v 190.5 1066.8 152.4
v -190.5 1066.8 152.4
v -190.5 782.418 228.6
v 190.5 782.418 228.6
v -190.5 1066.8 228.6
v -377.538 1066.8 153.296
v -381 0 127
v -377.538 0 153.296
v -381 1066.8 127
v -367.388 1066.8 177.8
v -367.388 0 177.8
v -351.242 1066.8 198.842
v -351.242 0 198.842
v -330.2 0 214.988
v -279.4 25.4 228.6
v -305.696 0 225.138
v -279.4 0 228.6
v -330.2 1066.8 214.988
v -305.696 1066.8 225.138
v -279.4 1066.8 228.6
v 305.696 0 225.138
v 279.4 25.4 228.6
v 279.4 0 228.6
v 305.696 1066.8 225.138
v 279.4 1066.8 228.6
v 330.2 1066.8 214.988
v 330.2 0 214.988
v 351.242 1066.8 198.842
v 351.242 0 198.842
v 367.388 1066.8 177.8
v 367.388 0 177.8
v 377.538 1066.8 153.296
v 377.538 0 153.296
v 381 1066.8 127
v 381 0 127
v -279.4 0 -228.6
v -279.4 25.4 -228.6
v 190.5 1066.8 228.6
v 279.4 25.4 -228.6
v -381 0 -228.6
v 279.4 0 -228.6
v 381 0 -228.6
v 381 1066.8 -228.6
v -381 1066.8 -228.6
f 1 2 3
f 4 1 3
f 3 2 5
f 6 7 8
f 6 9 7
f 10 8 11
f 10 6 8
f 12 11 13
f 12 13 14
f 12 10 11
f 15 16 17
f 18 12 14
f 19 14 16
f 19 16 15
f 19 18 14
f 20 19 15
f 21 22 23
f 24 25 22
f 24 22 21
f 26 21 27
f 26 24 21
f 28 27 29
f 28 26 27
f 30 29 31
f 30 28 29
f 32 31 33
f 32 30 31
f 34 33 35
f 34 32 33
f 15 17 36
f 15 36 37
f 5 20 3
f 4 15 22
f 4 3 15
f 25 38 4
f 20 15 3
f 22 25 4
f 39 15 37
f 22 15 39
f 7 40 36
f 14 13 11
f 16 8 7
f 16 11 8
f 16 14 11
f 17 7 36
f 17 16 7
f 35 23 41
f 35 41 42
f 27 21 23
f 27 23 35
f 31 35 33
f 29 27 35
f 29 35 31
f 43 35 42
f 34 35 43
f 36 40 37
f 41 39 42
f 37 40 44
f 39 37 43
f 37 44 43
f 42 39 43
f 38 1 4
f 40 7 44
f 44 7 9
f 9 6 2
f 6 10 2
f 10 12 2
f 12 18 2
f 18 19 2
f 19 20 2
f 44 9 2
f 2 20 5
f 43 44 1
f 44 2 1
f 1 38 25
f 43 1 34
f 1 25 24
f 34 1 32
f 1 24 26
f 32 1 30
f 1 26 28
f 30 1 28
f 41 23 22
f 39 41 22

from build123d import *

# Parameters (mm, degrees)
SKETCH1_W           = 762
SKETCH1_H           = 1066.8
BOSS_EXTRUDE1_DEPTH = 228.6
FILLET1_R           = 101.6
SKETCH2_W           = 558.8
SKETCH2_H           = 25.4
CUT_EXTRUDE1_DEPTH  = 1222.578929091
CUT_EXTRUDE2_DEPTH  = 190.5


with BuildPart() as part:
    # Sketch1 → Boss-Extrude1 (new, symmetric)
    with BuildSketch(Plane.XY):
        with Locations((0, 533.4)):
            Rectangle(SKETCH1_W, SKETCH1_H)
    extrude(amount=BOSS_EXTRUDE1_DEPTH, both=True)

    # Fillet1
    fillet1_edges = [part.edges().sort_by_distance(p)[0] for p in [
        (381, 533.4, 228.6),
        (-381, 533.4, 228.6),
    ]]
    fillet(fillet1_edges, radius=FILLET1_R)

    # Sketch2 → Cut-Extrude1 (cut, through all)
    with BuildSketch(Plane.XY.offset(228.6)):
        with Locations((0, 12.7)):
            Rectangle(SKETCH2_W, SKETCH2_H)
    extrude(amount=-CUT_EXTRUDE1_DEPTH, mode=Mode.SUBTRACT)

    # Sketch3 → Cut-Extrude2 (cut, symmetric)
    with BuildSketch(Plane(origin=(0, 0, 0), x_dir=(0, 0, -1), z_dir=(1, 0, 0))):
        Polygon((-152.4, 1066.8), (-228.6, 782.417728463), (-228.6, 1066.8), align=None)
    extrude(amount=CUT_EXTRUDE2_DEPTH, both=True, mode=Mode.SUBTRACT)


solid = part.part
